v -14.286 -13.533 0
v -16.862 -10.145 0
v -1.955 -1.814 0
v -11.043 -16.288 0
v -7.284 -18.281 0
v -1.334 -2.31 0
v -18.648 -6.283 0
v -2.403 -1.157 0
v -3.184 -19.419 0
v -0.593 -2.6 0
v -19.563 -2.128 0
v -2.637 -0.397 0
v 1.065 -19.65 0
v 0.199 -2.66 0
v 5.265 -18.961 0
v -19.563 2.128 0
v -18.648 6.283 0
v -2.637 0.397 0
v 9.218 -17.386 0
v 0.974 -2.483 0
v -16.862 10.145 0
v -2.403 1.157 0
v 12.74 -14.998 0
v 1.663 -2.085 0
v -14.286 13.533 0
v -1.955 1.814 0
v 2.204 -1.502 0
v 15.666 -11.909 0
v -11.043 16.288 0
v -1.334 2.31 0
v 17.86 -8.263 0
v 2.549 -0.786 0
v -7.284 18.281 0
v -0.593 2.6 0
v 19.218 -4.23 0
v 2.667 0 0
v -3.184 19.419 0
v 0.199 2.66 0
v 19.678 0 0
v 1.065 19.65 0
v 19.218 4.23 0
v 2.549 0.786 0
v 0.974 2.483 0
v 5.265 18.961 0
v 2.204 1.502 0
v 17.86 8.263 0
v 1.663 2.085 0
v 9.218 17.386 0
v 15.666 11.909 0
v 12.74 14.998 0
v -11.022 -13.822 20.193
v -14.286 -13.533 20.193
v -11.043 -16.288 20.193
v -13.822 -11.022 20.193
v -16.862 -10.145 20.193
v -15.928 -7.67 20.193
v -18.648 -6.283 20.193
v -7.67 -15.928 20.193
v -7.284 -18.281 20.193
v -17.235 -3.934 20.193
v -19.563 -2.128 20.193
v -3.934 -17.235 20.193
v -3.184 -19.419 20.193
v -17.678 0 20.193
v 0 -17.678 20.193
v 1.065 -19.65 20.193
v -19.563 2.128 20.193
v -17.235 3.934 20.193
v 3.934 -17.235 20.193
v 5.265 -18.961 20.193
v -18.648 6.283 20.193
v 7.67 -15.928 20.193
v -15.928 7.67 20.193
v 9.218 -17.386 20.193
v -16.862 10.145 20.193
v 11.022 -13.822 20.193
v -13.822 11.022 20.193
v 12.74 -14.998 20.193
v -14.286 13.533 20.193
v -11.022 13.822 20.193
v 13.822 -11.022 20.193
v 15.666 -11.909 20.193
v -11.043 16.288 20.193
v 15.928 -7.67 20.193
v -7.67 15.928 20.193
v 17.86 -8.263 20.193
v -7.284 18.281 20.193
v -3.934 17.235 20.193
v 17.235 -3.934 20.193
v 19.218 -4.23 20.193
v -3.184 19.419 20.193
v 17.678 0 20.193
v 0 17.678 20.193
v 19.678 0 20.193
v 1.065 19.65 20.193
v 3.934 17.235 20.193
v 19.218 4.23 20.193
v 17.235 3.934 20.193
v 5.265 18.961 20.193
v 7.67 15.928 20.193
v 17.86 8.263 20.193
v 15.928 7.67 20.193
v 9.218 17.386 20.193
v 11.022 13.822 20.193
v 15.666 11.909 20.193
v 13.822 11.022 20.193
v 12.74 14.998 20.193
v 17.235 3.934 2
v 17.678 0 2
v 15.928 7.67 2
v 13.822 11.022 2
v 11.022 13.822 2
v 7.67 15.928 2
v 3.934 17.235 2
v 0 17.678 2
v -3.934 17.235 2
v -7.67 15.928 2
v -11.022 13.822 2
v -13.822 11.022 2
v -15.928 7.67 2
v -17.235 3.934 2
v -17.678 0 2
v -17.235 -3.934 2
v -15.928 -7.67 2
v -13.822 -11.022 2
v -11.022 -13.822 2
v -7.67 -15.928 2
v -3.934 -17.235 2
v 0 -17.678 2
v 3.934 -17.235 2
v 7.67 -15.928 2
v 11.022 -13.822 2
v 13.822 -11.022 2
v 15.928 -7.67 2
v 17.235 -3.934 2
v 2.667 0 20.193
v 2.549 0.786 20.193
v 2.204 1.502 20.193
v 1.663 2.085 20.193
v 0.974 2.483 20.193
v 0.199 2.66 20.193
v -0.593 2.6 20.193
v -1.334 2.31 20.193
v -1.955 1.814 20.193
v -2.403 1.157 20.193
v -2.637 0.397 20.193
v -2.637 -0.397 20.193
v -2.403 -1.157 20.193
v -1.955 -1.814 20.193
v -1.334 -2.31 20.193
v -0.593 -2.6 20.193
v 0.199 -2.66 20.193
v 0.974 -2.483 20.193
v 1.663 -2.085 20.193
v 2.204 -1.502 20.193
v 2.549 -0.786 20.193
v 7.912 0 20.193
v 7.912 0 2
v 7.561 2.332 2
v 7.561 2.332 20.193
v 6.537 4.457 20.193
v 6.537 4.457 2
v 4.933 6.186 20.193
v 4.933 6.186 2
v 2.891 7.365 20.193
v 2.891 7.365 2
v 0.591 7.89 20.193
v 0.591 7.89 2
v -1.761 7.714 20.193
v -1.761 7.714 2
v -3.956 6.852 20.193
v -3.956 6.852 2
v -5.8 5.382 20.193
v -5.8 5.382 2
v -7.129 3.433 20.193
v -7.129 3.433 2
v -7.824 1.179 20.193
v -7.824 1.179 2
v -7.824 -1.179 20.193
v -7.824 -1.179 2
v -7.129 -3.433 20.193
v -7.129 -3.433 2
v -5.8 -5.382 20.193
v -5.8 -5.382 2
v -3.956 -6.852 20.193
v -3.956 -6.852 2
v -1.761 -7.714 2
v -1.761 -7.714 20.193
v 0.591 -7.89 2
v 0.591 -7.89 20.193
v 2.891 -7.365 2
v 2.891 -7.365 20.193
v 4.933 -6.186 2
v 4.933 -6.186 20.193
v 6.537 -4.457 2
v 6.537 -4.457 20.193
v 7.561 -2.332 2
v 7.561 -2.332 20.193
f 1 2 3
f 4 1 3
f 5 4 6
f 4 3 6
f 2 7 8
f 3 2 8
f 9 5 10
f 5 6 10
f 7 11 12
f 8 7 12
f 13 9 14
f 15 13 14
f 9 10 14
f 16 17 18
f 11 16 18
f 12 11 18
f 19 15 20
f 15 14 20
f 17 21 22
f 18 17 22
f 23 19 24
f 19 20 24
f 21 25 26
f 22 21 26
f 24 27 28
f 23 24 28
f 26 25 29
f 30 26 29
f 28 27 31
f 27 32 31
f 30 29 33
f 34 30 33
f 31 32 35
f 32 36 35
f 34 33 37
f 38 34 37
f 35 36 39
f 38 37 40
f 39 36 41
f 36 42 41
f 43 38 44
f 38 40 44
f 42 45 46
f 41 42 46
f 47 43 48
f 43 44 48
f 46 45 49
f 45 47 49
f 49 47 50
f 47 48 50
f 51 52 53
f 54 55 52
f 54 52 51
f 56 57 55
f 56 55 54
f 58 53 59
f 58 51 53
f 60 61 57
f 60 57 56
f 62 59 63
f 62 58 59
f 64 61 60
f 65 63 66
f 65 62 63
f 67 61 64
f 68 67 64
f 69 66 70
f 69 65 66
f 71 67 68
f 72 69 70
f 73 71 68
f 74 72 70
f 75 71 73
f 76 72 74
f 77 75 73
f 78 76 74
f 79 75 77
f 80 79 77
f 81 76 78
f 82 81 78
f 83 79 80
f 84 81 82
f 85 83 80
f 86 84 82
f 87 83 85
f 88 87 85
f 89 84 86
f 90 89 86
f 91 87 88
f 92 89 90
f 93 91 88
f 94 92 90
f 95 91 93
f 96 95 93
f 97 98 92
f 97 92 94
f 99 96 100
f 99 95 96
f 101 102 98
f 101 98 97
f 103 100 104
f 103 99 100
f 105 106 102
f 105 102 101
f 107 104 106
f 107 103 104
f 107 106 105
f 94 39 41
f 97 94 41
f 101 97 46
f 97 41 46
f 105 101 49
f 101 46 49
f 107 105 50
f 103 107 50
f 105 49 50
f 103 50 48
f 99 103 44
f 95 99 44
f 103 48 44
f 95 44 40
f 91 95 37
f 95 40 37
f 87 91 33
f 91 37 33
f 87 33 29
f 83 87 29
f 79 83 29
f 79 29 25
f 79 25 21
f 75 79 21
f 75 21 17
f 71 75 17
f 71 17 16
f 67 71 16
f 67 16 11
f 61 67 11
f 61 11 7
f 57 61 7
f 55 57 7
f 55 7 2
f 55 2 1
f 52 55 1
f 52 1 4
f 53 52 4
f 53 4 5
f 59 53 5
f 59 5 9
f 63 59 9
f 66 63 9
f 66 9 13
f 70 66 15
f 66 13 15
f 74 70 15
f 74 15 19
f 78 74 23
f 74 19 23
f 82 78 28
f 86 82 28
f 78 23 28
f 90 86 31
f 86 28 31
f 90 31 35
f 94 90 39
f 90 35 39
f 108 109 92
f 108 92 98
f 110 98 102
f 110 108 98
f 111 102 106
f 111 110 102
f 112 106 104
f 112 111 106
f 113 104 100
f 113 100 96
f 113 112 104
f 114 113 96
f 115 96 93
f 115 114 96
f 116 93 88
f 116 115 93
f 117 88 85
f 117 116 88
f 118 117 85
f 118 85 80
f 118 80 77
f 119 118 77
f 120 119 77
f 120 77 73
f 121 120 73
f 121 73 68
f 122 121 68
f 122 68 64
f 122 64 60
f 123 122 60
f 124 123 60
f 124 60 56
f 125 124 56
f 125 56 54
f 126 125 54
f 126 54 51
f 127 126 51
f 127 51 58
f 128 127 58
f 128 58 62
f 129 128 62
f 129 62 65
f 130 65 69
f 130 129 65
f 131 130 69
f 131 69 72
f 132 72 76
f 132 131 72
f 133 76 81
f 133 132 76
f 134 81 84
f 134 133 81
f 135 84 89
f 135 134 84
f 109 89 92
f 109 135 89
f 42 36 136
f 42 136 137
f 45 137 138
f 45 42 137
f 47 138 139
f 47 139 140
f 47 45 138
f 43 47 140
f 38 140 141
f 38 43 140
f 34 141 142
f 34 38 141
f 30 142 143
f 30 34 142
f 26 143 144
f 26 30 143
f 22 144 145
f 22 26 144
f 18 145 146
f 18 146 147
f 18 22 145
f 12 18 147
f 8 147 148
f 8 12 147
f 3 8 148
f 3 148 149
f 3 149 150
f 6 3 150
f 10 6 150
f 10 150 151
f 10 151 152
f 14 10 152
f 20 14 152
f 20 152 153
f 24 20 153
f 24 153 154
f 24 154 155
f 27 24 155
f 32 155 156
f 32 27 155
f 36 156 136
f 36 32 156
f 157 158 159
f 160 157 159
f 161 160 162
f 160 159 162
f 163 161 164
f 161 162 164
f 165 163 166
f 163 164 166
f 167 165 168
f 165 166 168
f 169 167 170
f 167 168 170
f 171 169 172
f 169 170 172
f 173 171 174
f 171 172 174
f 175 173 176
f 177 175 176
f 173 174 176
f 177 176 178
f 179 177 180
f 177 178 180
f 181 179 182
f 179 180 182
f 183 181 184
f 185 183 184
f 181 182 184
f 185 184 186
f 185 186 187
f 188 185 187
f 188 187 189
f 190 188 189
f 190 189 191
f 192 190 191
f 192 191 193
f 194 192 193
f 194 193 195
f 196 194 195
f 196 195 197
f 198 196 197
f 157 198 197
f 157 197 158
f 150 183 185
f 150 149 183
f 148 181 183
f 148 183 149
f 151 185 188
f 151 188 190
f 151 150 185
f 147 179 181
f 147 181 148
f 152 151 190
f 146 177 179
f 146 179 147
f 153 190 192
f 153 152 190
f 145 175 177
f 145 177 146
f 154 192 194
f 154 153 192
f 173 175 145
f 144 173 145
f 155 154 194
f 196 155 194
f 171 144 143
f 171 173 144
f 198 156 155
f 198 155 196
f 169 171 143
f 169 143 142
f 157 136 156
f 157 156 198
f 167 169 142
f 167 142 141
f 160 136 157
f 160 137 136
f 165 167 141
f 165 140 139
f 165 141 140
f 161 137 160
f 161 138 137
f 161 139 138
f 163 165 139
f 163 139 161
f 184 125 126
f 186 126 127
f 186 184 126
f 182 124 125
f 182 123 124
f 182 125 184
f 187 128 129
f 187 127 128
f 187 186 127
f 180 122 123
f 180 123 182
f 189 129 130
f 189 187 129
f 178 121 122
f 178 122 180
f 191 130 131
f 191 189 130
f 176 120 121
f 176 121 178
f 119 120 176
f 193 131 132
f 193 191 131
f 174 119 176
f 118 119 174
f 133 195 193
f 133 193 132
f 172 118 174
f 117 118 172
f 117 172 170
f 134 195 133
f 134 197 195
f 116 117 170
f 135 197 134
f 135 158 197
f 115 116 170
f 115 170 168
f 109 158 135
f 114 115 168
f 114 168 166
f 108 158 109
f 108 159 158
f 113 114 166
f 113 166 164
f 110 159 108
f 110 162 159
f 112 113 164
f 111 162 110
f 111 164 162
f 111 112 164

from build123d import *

# Parameters (mm, degrees)
SKETCH_R      = 7.9121
SKETCH_R_2    = 2.667
PAD_DEPTH     = 20.193
SKETCH001_R   = 19.6784
SKETCH001_R_2 = 5.334
PAD001_DEPTH  = 2
SKETCH002_R   = 19.6784
SKETCH002_R_2 = 17.6784
PAD002_DEPTH  = 20.193


with BuildPart() as part:
    # Sketch → Pad (new body)
    with BuildSketch(Plane.XY):
        Circle(SKETCH_R)
        Circle(SKETCH_R_2, mode=Mode.SUBTRACT)
    extrude(amount=PAD_DEPTH)

    # Sketch001 → Pad001 (join)
    with BuildSketch(Plane.XY):
        Circle(SKETCH001_R)
        Circle(SKETCH001_R_2, mode=Mode.SUBTRACT)
    extrude(amount=PAD001_DEPTH)

    # Sketch002 → Pad002 (join)
    with BuildSketch(Plane.XY):
        Circle(SKETCH002_R)
        Circle(SKETCH002_R_2, mode=Mode.SUBTRACT)
    extrude(amount=PAD002_DEPTH)


solid = part.part
